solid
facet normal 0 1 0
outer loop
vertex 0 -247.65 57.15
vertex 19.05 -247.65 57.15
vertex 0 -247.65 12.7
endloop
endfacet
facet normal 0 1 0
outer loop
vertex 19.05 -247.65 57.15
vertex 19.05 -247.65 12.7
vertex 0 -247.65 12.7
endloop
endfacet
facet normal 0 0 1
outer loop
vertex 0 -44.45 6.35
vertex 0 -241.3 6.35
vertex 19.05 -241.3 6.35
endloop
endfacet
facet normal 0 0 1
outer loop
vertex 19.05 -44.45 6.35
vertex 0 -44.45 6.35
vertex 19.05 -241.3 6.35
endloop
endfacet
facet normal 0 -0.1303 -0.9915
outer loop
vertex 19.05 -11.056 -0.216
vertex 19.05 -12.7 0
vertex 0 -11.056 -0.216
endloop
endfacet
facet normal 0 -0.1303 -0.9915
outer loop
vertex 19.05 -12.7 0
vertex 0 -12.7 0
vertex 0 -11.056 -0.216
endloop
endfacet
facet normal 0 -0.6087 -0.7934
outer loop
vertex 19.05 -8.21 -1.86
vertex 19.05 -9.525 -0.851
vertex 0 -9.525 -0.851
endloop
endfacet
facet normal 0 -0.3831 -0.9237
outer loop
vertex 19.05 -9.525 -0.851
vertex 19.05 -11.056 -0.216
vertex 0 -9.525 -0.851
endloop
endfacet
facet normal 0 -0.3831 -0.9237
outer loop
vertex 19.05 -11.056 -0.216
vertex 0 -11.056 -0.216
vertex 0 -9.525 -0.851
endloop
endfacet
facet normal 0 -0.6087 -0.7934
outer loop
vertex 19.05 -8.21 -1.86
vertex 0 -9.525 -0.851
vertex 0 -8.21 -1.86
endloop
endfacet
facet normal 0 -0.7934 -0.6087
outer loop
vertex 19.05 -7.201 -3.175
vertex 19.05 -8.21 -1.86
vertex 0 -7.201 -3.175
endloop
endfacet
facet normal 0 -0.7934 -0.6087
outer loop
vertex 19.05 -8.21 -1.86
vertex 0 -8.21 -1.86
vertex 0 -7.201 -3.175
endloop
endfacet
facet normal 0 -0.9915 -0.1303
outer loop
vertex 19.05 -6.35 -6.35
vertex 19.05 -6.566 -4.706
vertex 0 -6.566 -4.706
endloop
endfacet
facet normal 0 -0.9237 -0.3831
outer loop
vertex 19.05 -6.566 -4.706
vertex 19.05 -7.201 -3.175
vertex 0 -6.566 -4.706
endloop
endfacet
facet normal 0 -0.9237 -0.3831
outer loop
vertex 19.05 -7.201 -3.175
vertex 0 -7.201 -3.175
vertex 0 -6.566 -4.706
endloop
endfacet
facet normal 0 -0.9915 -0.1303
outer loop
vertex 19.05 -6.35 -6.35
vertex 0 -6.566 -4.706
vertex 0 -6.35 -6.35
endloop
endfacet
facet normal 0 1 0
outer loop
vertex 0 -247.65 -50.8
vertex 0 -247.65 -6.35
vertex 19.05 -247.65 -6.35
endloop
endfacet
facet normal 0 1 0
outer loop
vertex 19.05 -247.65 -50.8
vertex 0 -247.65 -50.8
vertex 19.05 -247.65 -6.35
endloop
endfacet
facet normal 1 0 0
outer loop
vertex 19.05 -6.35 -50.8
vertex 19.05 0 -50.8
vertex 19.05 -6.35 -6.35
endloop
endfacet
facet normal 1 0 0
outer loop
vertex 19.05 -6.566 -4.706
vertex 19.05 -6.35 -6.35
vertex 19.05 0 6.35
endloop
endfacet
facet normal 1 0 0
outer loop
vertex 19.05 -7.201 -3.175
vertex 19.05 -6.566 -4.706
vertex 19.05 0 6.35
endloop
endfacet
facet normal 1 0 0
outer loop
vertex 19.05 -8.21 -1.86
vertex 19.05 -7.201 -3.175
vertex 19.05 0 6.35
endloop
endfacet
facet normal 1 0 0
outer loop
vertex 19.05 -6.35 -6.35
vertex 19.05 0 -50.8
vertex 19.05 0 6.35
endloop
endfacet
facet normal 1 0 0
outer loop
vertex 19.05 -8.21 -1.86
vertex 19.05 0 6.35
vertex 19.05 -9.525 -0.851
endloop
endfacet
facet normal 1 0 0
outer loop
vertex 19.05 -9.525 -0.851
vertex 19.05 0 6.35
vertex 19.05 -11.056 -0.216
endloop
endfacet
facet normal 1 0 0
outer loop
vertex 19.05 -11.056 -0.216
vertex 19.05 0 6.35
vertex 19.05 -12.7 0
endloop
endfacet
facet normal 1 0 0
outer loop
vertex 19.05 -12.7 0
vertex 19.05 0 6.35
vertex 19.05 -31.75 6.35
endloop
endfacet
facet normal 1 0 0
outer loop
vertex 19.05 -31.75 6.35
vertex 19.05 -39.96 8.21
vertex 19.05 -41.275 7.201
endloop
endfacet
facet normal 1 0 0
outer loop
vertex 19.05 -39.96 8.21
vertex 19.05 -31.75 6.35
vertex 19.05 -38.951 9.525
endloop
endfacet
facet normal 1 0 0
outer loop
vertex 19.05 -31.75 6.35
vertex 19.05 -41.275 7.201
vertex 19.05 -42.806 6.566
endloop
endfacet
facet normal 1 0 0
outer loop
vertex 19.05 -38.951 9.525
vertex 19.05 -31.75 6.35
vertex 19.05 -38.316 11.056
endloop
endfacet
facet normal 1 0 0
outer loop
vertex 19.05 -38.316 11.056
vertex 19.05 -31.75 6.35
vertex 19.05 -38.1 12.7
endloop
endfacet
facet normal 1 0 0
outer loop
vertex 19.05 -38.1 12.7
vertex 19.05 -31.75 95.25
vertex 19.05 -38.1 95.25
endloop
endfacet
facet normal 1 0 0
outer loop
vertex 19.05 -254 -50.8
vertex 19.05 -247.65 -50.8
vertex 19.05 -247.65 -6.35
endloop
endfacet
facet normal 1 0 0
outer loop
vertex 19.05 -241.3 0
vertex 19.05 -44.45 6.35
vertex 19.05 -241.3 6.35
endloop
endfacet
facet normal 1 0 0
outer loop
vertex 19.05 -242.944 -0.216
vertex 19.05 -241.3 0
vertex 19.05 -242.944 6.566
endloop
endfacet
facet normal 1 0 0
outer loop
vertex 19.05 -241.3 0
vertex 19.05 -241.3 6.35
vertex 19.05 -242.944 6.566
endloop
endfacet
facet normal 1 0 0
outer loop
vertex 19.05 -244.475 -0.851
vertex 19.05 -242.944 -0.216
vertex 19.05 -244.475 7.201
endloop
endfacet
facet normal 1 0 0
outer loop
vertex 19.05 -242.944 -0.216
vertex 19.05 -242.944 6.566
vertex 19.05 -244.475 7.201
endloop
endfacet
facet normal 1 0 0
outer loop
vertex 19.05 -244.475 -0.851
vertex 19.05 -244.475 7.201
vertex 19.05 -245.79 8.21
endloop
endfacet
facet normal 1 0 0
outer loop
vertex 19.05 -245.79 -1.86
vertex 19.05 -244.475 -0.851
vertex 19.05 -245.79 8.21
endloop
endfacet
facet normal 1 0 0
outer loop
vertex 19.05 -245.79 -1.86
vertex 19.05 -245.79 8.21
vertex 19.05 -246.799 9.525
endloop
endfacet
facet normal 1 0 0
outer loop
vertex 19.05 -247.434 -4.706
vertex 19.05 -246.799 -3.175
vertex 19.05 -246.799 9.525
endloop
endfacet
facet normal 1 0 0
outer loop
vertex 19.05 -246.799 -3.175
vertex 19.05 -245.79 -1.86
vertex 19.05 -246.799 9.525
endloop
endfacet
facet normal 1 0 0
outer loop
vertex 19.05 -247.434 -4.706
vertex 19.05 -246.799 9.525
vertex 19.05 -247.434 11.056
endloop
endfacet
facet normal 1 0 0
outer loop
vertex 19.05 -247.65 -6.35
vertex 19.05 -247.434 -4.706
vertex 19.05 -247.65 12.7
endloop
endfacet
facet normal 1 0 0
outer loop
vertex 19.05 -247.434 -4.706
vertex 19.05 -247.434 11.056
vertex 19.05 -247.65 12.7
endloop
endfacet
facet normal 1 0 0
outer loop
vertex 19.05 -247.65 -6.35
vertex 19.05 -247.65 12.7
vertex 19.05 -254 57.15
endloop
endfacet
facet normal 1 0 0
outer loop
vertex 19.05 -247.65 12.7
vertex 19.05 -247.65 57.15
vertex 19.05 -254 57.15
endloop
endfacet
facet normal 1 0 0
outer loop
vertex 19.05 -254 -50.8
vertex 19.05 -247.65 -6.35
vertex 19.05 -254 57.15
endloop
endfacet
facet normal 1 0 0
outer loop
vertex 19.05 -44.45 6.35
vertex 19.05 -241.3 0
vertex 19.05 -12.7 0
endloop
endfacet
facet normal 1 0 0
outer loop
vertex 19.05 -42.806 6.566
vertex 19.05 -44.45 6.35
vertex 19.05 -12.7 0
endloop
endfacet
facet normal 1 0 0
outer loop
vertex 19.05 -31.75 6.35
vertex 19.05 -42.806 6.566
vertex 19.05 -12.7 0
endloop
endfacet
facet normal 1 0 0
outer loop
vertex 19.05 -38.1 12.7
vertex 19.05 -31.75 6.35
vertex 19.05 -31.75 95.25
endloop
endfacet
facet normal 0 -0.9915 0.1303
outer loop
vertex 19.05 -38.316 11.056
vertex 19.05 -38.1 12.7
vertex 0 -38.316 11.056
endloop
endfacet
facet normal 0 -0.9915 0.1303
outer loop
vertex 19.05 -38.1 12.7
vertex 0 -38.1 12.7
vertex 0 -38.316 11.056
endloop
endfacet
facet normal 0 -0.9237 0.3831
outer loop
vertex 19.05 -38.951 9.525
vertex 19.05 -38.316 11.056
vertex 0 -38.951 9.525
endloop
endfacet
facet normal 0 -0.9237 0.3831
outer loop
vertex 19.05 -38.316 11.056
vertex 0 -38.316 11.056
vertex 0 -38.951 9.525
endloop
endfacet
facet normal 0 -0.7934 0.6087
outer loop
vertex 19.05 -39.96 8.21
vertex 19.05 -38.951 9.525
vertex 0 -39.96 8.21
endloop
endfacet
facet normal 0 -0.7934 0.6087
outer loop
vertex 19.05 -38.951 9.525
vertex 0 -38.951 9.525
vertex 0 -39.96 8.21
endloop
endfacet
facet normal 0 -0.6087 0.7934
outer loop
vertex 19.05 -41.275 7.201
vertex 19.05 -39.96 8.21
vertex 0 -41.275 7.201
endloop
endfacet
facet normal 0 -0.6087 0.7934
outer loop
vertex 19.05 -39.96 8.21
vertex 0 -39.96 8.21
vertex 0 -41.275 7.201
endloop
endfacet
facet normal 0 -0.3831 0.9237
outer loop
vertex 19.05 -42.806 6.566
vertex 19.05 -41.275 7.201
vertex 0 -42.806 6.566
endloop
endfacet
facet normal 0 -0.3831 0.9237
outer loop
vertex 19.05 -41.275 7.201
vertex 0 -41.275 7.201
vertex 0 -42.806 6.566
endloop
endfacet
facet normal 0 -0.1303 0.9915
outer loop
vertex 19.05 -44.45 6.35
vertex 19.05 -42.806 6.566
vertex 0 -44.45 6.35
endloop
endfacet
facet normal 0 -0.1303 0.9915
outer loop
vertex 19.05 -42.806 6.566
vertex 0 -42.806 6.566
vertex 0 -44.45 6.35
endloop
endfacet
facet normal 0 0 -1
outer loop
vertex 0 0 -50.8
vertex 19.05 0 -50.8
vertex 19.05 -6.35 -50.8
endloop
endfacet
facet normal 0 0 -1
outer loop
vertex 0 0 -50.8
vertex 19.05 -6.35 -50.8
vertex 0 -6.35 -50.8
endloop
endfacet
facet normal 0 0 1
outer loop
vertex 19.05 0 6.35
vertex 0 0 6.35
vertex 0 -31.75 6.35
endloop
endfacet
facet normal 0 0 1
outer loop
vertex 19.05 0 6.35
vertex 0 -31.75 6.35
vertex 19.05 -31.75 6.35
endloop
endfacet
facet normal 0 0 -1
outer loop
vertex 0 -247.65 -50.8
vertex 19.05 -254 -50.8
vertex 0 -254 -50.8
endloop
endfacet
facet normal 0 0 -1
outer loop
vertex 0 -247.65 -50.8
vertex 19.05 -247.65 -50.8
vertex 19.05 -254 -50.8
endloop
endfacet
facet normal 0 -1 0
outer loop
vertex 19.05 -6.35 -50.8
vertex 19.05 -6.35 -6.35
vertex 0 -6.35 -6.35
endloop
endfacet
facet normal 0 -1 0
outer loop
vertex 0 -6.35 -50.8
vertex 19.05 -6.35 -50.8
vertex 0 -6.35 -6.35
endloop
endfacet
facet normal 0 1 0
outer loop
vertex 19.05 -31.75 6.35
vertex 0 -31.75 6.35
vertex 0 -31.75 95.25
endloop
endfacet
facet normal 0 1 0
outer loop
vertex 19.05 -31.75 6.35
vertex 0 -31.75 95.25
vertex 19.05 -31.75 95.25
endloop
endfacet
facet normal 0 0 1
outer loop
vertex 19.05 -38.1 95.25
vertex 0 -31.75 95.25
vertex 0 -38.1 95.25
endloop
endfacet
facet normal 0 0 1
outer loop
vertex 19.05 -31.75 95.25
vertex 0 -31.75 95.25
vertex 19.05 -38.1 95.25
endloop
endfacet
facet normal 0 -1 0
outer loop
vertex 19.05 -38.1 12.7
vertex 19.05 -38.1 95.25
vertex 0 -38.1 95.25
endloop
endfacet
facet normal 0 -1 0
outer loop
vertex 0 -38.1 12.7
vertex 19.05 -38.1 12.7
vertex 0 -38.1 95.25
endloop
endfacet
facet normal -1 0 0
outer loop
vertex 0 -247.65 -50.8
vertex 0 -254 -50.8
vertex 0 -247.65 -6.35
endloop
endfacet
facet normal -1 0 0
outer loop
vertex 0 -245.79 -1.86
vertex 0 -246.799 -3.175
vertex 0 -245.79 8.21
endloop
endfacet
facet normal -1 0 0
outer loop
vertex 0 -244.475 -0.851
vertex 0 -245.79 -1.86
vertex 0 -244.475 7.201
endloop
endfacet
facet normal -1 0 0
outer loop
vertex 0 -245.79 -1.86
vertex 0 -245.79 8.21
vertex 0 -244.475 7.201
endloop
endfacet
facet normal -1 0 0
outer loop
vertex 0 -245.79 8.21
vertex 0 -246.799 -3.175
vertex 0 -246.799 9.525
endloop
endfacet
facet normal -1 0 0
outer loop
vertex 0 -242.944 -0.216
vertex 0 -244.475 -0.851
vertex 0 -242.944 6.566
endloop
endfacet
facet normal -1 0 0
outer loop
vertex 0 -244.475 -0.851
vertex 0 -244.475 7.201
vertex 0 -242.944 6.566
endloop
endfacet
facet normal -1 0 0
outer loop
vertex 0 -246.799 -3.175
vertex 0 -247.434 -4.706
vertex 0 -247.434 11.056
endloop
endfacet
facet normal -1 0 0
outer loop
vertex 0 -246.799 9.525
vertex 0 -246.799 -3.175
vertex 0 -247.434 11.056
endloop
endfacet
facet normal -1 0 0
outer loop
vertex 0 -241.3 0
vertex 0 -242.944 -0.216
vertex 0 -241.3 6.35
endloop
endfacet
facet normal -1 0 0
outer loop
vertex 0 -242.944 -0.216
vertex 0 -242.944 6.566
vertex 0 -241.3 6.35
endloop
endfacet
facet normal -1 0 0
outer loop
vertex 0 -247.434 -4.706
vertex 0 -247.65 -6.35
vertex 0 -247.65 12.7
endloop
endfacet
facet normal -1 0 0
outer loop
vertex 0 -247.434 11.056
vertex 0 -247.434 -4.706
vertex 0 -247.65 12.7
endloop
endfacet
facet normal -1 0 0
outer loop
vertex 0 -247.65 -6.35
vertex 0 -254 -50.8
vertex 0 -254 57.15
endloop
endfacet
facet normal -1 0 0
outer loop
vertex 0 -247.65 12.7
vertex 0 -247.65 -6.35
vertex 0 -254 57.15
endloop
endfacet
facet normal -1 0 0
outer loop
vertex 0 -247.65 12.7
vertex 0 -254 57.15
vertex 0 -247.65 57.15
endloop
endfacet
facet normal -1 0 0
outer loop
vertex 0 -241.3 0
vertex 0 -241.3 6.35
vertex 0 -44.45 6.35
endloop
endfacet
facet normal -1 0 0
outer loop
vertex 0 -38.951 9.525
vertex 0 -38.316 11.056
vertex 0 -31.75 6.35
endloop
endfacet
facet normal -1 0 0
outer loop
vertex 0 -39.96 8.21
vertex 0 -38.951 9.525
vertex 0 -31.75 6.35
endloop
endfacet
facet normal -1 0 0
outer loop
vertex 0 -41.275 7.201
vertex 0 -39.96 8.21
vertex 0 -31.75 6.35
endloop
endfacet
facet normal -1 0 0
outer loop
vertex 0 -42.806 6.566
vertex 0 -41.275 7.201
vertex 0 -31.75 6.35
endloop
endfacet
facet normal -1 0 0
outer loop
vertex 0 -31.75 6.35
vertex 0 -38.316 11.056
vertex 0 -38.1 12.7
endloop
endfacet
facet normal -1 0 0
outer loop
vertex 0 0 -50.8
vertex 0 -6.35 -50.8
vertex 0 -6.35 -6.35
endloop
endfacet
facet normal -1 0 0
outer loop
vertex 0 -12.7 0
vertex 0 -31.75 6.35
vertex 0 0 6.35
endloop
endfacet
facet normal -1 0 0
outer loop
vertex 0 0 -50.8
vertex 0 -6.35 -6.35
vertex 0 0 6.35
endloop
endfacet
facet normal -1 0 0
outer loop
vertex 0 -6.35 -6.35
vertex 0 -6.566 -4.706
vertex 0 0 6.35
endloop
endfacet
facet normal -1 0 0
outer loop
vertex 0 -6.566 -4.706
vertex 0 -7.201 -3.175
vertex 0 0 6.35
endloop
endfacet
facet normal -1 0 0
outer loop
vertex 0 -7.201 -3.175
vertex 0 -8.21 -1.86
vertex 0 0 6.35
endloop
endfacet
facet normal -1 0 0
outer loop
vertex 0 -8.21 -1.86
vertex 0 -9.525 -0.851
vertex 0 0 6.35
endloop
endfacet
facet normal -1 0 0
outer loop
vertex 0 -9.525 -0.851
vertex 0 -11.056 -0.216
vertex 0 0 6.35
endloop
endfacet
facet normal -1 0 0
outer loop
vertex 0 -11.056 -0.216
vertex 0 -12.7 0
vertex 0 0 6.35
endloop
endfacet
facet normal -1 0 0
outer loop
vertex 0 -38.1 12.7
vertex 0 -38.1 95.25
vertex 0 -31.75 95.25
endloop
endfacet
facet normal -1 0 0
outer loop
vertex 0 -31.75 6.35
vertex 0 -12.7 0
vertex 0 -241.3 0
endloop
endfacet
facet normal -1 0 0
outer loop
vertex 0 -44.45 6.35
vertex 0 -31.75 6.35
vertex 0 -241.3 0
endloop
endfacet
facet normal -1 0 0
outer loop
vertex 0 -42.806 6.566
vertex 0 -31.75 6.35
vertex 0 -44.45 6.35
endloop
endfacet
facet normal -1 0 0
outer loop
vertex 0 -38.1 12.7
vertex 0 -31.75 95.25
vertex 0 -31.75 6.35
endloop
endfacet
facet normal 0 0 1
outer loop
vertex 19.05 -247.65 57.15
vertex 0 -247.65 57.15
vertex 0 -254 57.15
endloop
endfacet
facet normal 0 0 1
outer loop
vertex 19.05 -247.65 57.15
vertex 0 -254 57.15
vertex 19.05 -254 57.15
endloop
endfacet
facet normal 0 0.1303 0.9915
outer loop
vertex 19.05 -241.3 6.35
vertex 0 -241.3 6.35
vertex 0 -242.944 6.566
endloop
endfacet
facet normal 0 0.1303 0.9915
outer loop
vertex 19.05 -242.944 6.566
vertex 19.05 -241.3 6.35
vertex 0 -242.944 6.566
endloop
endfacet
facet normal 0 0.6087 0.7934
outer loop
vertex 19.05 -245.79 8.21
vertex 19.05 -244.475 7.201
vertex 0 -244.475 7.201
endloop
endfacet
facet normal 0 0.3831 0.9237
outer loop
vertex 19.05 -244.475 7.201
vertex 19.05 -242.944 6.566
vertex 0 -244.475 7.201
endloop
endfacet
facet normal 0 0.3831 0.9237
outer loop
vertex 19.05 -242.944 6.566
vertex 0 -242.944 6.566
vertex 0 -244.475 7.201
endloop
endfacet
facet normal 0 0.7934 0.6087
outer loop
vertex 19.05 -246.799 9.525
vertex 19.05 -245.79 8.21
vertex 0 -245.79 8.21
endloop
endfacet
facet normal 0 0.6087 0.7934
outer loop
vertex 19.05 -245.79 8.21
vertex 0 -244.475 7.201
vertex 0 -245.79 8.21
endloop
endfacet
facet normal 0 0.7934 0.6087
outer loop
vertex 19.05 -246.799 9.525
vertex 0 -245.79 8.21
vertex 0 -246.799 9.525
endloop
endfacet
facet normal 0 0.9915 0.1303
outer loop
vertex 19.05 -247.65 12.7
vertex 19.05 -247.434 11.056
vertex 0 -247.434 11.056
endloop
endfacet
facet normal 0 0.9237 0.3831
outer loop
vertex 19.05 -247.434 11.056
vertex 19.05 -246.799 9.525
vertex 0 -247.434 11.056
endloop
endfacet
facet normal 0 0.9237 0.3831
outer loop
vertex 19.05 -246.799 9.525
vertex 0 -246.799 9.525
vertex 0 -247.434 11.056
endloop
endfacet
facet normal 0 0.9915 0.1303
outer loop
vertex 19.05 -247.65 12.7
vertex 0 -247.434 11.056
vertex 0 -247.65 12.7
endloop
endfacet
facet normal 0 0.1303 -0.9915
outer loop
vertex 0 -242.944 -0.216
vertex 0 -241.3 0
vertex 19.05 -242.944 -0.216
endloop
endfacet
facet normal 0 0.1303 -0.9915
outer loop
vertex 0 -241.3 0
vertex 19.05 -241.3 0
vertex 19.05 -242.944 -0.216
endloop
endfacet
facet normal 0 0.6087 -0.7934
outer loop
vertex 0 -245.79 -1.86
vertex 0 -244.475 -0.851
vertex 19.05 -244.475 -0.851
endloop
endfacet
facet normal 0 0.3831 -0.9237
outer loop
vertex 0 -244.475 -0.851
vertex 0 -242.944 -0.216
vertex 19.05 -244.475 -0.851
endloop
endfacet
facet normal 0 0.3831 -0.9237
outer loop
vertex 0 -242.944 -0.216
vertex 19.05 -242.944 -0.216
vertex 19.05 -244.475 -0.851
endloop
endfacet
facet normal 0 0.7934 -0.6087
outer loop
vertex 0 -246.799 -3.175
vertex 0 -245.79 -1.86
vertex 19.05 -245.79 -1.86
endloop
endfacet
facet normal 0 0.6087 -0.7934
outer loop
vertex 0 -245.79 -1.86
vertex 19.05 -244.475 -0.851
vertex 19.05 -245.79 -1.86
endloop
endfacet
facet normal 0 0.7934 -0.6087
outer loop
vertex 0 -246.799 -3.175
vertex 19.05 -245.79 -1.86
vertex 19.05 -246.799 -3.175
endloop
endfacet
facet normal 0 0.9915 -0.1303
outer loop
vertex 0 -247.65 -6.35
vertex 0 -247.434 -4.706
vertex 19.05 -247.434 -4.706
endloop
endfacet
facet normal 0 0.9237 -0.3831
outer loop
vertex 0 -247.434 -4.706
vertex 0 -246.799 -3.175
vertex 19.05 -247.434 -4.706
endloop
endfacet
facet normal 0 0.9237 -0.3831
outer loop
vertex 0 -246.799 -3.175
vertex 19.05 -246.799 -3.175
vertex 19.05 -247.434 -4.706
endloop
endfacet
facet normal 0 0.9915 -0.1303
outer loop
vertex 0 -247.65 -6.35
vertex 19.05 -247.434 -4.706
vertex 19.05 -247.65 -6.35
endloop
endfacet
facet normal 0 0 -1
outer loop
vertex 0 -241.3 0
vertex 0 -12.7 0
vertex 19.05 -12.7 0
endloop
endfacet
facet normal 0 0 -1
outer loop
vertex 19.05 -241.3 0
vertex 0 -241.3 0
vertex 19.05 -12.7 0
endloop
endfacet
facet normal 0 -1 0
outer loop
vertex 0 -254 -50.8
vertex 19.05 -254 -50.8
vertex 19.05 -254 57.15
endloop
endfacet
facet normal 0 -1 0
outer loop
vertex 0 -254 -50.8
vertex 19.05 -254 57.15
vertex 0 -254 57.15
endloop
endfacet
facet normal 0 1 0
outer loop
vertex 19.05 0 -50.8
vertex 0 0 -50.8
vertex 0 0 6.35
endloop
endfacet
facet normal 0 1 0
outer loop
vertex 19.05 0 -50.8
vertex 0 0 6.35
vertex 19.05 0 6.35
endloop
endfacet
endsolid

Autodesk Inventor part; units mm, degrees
ref_plane "YZ Plane" through (0, 0, 0) normal (1, 0, 0) x (0, 1, 0)
ref_plane "XZ Plane" through (0, 0, 0) normal (0, 1, 0) x (-1, 0, 0)
ref_plane "XY Plane" through (0, 0, 0) normal (0, 0, 1) x (1, 0, 0)
sketch "Sketch3" plane through (0, 0, 0) normal (0, 0, 1) x (1, 0, 0)
  line L0 (0, 0) -> (19.05, 0)
  line L1 (19.05, 0) -> (19.05, -254)
  line L2 (19.05, -254) -> (0, -254)
  line L3 (0, -254) -> (0, 0)
  dimension "d0" = 19.05
  dimension "d1" = 254
extrude "Extrusion1" add sketch "Sketch3" along normal blind 6.35
sketch "Sketch4" plane through (19.05, -254, 0) normal (1, 0, 0) x (0, 0, -1)
  point P0 (0, 254)
sketch "Sketch5" plane through (0, 0, 6.35) normal (0, 0, 1) x (1, 0, 0)
  line L0 (19.05, 0) -> (0, 0) projected
  line L1 (0, 0) -> (0, -31.75)
  line L2 (0, 0) -> (0, -254) projected
  line L3 (19.05, -254) -> (19.05, 0) projected
  line L4 (0, -31.75) -> (19.05, -31.75)
  line L5 (19.05, -31.75) -> (19.05, -38.1)
  line L6 (19.05, -38.1) -> (0, -38.1)
  line L7 (0, -38.1) -> (0, -31.75)
  dimension "d4" = 31.75
  dimension "d5" = 6.35
extrude "Extrusion2" add sketch "Sketch5" along normal blind 88.9 contours L3 L6 L2 L4
sketch "Sketch6" plane through (0, 0, 0) normal (0, 0, -1) x (-1, 0, 0)
  line L0 (-19.05, -31.75) -> (-19.05, 0) projected
  line L1 (0, 0) -> (-19.05, 0)
  line L2 (-19.05, 0) -> (-19.05, -6.35)
  line L3 (-19.05, -6.35) -> (0, -6.35)
  line L4 (0, -6.35) -> (0, 0)
  dimension "d8" = 6.35
extrude "Extrusion3" add sketch "Sketch6" along normal blind 50.8
fillet "Fillet2" radius 6.35 2 edges at (9.525, -38.1, 6.35) (9.525, -6.35, 0)
sketch "Sketch7" plane through (0, 0, 6.35) normal (0, 0, 1) x (1, 0, 0)
  line L0 (0, -254) -> (19.05, -254) projected
  line L1 (0, -254) -> (19.05, -254)
  line L2 (19.05, -254) -> (19.05, -247.65)
  line L3 (19.05, -247.65) -> (0, -247.65)
  line L4 (0, -247.65) -> (0, -254)
  point P0 (0, 0)
  dimension "d13" = 19.05
  dimension "d14" = 6.35
extrude "Extrusion4" add sketch "Sketch7" along normal blind 50.8
sketch "Sketch8" plane through (0, 0, 0) normal (0, 0, -1) x (-1, 0, 0)
  line L0 (-19.05, -254) -> (0, -254) projected
  line L1 (0, -254) -> (0, -12.7) projected
  line L2 (-19.05, -254) -> (0, -254)
  line L3 (0, -254) -> (0, -247.65)
  line L4 (0, -247.65) -> (-19.05, -247.65)
  line L5 (-19.05, -247.65) -> (-19.05, -254)
  point P0 (0, 0)
  dimension "d17" = 6.35
extrude "Extrusion5" add sketch "Sketch8" along normal blind 50.8
fillet "Fillet3" radius 6.35 2 edges at (9.525, -247.65, 0) (9.525, -247.65, 6.35)
properties part number "RightTopPlateConnector"
